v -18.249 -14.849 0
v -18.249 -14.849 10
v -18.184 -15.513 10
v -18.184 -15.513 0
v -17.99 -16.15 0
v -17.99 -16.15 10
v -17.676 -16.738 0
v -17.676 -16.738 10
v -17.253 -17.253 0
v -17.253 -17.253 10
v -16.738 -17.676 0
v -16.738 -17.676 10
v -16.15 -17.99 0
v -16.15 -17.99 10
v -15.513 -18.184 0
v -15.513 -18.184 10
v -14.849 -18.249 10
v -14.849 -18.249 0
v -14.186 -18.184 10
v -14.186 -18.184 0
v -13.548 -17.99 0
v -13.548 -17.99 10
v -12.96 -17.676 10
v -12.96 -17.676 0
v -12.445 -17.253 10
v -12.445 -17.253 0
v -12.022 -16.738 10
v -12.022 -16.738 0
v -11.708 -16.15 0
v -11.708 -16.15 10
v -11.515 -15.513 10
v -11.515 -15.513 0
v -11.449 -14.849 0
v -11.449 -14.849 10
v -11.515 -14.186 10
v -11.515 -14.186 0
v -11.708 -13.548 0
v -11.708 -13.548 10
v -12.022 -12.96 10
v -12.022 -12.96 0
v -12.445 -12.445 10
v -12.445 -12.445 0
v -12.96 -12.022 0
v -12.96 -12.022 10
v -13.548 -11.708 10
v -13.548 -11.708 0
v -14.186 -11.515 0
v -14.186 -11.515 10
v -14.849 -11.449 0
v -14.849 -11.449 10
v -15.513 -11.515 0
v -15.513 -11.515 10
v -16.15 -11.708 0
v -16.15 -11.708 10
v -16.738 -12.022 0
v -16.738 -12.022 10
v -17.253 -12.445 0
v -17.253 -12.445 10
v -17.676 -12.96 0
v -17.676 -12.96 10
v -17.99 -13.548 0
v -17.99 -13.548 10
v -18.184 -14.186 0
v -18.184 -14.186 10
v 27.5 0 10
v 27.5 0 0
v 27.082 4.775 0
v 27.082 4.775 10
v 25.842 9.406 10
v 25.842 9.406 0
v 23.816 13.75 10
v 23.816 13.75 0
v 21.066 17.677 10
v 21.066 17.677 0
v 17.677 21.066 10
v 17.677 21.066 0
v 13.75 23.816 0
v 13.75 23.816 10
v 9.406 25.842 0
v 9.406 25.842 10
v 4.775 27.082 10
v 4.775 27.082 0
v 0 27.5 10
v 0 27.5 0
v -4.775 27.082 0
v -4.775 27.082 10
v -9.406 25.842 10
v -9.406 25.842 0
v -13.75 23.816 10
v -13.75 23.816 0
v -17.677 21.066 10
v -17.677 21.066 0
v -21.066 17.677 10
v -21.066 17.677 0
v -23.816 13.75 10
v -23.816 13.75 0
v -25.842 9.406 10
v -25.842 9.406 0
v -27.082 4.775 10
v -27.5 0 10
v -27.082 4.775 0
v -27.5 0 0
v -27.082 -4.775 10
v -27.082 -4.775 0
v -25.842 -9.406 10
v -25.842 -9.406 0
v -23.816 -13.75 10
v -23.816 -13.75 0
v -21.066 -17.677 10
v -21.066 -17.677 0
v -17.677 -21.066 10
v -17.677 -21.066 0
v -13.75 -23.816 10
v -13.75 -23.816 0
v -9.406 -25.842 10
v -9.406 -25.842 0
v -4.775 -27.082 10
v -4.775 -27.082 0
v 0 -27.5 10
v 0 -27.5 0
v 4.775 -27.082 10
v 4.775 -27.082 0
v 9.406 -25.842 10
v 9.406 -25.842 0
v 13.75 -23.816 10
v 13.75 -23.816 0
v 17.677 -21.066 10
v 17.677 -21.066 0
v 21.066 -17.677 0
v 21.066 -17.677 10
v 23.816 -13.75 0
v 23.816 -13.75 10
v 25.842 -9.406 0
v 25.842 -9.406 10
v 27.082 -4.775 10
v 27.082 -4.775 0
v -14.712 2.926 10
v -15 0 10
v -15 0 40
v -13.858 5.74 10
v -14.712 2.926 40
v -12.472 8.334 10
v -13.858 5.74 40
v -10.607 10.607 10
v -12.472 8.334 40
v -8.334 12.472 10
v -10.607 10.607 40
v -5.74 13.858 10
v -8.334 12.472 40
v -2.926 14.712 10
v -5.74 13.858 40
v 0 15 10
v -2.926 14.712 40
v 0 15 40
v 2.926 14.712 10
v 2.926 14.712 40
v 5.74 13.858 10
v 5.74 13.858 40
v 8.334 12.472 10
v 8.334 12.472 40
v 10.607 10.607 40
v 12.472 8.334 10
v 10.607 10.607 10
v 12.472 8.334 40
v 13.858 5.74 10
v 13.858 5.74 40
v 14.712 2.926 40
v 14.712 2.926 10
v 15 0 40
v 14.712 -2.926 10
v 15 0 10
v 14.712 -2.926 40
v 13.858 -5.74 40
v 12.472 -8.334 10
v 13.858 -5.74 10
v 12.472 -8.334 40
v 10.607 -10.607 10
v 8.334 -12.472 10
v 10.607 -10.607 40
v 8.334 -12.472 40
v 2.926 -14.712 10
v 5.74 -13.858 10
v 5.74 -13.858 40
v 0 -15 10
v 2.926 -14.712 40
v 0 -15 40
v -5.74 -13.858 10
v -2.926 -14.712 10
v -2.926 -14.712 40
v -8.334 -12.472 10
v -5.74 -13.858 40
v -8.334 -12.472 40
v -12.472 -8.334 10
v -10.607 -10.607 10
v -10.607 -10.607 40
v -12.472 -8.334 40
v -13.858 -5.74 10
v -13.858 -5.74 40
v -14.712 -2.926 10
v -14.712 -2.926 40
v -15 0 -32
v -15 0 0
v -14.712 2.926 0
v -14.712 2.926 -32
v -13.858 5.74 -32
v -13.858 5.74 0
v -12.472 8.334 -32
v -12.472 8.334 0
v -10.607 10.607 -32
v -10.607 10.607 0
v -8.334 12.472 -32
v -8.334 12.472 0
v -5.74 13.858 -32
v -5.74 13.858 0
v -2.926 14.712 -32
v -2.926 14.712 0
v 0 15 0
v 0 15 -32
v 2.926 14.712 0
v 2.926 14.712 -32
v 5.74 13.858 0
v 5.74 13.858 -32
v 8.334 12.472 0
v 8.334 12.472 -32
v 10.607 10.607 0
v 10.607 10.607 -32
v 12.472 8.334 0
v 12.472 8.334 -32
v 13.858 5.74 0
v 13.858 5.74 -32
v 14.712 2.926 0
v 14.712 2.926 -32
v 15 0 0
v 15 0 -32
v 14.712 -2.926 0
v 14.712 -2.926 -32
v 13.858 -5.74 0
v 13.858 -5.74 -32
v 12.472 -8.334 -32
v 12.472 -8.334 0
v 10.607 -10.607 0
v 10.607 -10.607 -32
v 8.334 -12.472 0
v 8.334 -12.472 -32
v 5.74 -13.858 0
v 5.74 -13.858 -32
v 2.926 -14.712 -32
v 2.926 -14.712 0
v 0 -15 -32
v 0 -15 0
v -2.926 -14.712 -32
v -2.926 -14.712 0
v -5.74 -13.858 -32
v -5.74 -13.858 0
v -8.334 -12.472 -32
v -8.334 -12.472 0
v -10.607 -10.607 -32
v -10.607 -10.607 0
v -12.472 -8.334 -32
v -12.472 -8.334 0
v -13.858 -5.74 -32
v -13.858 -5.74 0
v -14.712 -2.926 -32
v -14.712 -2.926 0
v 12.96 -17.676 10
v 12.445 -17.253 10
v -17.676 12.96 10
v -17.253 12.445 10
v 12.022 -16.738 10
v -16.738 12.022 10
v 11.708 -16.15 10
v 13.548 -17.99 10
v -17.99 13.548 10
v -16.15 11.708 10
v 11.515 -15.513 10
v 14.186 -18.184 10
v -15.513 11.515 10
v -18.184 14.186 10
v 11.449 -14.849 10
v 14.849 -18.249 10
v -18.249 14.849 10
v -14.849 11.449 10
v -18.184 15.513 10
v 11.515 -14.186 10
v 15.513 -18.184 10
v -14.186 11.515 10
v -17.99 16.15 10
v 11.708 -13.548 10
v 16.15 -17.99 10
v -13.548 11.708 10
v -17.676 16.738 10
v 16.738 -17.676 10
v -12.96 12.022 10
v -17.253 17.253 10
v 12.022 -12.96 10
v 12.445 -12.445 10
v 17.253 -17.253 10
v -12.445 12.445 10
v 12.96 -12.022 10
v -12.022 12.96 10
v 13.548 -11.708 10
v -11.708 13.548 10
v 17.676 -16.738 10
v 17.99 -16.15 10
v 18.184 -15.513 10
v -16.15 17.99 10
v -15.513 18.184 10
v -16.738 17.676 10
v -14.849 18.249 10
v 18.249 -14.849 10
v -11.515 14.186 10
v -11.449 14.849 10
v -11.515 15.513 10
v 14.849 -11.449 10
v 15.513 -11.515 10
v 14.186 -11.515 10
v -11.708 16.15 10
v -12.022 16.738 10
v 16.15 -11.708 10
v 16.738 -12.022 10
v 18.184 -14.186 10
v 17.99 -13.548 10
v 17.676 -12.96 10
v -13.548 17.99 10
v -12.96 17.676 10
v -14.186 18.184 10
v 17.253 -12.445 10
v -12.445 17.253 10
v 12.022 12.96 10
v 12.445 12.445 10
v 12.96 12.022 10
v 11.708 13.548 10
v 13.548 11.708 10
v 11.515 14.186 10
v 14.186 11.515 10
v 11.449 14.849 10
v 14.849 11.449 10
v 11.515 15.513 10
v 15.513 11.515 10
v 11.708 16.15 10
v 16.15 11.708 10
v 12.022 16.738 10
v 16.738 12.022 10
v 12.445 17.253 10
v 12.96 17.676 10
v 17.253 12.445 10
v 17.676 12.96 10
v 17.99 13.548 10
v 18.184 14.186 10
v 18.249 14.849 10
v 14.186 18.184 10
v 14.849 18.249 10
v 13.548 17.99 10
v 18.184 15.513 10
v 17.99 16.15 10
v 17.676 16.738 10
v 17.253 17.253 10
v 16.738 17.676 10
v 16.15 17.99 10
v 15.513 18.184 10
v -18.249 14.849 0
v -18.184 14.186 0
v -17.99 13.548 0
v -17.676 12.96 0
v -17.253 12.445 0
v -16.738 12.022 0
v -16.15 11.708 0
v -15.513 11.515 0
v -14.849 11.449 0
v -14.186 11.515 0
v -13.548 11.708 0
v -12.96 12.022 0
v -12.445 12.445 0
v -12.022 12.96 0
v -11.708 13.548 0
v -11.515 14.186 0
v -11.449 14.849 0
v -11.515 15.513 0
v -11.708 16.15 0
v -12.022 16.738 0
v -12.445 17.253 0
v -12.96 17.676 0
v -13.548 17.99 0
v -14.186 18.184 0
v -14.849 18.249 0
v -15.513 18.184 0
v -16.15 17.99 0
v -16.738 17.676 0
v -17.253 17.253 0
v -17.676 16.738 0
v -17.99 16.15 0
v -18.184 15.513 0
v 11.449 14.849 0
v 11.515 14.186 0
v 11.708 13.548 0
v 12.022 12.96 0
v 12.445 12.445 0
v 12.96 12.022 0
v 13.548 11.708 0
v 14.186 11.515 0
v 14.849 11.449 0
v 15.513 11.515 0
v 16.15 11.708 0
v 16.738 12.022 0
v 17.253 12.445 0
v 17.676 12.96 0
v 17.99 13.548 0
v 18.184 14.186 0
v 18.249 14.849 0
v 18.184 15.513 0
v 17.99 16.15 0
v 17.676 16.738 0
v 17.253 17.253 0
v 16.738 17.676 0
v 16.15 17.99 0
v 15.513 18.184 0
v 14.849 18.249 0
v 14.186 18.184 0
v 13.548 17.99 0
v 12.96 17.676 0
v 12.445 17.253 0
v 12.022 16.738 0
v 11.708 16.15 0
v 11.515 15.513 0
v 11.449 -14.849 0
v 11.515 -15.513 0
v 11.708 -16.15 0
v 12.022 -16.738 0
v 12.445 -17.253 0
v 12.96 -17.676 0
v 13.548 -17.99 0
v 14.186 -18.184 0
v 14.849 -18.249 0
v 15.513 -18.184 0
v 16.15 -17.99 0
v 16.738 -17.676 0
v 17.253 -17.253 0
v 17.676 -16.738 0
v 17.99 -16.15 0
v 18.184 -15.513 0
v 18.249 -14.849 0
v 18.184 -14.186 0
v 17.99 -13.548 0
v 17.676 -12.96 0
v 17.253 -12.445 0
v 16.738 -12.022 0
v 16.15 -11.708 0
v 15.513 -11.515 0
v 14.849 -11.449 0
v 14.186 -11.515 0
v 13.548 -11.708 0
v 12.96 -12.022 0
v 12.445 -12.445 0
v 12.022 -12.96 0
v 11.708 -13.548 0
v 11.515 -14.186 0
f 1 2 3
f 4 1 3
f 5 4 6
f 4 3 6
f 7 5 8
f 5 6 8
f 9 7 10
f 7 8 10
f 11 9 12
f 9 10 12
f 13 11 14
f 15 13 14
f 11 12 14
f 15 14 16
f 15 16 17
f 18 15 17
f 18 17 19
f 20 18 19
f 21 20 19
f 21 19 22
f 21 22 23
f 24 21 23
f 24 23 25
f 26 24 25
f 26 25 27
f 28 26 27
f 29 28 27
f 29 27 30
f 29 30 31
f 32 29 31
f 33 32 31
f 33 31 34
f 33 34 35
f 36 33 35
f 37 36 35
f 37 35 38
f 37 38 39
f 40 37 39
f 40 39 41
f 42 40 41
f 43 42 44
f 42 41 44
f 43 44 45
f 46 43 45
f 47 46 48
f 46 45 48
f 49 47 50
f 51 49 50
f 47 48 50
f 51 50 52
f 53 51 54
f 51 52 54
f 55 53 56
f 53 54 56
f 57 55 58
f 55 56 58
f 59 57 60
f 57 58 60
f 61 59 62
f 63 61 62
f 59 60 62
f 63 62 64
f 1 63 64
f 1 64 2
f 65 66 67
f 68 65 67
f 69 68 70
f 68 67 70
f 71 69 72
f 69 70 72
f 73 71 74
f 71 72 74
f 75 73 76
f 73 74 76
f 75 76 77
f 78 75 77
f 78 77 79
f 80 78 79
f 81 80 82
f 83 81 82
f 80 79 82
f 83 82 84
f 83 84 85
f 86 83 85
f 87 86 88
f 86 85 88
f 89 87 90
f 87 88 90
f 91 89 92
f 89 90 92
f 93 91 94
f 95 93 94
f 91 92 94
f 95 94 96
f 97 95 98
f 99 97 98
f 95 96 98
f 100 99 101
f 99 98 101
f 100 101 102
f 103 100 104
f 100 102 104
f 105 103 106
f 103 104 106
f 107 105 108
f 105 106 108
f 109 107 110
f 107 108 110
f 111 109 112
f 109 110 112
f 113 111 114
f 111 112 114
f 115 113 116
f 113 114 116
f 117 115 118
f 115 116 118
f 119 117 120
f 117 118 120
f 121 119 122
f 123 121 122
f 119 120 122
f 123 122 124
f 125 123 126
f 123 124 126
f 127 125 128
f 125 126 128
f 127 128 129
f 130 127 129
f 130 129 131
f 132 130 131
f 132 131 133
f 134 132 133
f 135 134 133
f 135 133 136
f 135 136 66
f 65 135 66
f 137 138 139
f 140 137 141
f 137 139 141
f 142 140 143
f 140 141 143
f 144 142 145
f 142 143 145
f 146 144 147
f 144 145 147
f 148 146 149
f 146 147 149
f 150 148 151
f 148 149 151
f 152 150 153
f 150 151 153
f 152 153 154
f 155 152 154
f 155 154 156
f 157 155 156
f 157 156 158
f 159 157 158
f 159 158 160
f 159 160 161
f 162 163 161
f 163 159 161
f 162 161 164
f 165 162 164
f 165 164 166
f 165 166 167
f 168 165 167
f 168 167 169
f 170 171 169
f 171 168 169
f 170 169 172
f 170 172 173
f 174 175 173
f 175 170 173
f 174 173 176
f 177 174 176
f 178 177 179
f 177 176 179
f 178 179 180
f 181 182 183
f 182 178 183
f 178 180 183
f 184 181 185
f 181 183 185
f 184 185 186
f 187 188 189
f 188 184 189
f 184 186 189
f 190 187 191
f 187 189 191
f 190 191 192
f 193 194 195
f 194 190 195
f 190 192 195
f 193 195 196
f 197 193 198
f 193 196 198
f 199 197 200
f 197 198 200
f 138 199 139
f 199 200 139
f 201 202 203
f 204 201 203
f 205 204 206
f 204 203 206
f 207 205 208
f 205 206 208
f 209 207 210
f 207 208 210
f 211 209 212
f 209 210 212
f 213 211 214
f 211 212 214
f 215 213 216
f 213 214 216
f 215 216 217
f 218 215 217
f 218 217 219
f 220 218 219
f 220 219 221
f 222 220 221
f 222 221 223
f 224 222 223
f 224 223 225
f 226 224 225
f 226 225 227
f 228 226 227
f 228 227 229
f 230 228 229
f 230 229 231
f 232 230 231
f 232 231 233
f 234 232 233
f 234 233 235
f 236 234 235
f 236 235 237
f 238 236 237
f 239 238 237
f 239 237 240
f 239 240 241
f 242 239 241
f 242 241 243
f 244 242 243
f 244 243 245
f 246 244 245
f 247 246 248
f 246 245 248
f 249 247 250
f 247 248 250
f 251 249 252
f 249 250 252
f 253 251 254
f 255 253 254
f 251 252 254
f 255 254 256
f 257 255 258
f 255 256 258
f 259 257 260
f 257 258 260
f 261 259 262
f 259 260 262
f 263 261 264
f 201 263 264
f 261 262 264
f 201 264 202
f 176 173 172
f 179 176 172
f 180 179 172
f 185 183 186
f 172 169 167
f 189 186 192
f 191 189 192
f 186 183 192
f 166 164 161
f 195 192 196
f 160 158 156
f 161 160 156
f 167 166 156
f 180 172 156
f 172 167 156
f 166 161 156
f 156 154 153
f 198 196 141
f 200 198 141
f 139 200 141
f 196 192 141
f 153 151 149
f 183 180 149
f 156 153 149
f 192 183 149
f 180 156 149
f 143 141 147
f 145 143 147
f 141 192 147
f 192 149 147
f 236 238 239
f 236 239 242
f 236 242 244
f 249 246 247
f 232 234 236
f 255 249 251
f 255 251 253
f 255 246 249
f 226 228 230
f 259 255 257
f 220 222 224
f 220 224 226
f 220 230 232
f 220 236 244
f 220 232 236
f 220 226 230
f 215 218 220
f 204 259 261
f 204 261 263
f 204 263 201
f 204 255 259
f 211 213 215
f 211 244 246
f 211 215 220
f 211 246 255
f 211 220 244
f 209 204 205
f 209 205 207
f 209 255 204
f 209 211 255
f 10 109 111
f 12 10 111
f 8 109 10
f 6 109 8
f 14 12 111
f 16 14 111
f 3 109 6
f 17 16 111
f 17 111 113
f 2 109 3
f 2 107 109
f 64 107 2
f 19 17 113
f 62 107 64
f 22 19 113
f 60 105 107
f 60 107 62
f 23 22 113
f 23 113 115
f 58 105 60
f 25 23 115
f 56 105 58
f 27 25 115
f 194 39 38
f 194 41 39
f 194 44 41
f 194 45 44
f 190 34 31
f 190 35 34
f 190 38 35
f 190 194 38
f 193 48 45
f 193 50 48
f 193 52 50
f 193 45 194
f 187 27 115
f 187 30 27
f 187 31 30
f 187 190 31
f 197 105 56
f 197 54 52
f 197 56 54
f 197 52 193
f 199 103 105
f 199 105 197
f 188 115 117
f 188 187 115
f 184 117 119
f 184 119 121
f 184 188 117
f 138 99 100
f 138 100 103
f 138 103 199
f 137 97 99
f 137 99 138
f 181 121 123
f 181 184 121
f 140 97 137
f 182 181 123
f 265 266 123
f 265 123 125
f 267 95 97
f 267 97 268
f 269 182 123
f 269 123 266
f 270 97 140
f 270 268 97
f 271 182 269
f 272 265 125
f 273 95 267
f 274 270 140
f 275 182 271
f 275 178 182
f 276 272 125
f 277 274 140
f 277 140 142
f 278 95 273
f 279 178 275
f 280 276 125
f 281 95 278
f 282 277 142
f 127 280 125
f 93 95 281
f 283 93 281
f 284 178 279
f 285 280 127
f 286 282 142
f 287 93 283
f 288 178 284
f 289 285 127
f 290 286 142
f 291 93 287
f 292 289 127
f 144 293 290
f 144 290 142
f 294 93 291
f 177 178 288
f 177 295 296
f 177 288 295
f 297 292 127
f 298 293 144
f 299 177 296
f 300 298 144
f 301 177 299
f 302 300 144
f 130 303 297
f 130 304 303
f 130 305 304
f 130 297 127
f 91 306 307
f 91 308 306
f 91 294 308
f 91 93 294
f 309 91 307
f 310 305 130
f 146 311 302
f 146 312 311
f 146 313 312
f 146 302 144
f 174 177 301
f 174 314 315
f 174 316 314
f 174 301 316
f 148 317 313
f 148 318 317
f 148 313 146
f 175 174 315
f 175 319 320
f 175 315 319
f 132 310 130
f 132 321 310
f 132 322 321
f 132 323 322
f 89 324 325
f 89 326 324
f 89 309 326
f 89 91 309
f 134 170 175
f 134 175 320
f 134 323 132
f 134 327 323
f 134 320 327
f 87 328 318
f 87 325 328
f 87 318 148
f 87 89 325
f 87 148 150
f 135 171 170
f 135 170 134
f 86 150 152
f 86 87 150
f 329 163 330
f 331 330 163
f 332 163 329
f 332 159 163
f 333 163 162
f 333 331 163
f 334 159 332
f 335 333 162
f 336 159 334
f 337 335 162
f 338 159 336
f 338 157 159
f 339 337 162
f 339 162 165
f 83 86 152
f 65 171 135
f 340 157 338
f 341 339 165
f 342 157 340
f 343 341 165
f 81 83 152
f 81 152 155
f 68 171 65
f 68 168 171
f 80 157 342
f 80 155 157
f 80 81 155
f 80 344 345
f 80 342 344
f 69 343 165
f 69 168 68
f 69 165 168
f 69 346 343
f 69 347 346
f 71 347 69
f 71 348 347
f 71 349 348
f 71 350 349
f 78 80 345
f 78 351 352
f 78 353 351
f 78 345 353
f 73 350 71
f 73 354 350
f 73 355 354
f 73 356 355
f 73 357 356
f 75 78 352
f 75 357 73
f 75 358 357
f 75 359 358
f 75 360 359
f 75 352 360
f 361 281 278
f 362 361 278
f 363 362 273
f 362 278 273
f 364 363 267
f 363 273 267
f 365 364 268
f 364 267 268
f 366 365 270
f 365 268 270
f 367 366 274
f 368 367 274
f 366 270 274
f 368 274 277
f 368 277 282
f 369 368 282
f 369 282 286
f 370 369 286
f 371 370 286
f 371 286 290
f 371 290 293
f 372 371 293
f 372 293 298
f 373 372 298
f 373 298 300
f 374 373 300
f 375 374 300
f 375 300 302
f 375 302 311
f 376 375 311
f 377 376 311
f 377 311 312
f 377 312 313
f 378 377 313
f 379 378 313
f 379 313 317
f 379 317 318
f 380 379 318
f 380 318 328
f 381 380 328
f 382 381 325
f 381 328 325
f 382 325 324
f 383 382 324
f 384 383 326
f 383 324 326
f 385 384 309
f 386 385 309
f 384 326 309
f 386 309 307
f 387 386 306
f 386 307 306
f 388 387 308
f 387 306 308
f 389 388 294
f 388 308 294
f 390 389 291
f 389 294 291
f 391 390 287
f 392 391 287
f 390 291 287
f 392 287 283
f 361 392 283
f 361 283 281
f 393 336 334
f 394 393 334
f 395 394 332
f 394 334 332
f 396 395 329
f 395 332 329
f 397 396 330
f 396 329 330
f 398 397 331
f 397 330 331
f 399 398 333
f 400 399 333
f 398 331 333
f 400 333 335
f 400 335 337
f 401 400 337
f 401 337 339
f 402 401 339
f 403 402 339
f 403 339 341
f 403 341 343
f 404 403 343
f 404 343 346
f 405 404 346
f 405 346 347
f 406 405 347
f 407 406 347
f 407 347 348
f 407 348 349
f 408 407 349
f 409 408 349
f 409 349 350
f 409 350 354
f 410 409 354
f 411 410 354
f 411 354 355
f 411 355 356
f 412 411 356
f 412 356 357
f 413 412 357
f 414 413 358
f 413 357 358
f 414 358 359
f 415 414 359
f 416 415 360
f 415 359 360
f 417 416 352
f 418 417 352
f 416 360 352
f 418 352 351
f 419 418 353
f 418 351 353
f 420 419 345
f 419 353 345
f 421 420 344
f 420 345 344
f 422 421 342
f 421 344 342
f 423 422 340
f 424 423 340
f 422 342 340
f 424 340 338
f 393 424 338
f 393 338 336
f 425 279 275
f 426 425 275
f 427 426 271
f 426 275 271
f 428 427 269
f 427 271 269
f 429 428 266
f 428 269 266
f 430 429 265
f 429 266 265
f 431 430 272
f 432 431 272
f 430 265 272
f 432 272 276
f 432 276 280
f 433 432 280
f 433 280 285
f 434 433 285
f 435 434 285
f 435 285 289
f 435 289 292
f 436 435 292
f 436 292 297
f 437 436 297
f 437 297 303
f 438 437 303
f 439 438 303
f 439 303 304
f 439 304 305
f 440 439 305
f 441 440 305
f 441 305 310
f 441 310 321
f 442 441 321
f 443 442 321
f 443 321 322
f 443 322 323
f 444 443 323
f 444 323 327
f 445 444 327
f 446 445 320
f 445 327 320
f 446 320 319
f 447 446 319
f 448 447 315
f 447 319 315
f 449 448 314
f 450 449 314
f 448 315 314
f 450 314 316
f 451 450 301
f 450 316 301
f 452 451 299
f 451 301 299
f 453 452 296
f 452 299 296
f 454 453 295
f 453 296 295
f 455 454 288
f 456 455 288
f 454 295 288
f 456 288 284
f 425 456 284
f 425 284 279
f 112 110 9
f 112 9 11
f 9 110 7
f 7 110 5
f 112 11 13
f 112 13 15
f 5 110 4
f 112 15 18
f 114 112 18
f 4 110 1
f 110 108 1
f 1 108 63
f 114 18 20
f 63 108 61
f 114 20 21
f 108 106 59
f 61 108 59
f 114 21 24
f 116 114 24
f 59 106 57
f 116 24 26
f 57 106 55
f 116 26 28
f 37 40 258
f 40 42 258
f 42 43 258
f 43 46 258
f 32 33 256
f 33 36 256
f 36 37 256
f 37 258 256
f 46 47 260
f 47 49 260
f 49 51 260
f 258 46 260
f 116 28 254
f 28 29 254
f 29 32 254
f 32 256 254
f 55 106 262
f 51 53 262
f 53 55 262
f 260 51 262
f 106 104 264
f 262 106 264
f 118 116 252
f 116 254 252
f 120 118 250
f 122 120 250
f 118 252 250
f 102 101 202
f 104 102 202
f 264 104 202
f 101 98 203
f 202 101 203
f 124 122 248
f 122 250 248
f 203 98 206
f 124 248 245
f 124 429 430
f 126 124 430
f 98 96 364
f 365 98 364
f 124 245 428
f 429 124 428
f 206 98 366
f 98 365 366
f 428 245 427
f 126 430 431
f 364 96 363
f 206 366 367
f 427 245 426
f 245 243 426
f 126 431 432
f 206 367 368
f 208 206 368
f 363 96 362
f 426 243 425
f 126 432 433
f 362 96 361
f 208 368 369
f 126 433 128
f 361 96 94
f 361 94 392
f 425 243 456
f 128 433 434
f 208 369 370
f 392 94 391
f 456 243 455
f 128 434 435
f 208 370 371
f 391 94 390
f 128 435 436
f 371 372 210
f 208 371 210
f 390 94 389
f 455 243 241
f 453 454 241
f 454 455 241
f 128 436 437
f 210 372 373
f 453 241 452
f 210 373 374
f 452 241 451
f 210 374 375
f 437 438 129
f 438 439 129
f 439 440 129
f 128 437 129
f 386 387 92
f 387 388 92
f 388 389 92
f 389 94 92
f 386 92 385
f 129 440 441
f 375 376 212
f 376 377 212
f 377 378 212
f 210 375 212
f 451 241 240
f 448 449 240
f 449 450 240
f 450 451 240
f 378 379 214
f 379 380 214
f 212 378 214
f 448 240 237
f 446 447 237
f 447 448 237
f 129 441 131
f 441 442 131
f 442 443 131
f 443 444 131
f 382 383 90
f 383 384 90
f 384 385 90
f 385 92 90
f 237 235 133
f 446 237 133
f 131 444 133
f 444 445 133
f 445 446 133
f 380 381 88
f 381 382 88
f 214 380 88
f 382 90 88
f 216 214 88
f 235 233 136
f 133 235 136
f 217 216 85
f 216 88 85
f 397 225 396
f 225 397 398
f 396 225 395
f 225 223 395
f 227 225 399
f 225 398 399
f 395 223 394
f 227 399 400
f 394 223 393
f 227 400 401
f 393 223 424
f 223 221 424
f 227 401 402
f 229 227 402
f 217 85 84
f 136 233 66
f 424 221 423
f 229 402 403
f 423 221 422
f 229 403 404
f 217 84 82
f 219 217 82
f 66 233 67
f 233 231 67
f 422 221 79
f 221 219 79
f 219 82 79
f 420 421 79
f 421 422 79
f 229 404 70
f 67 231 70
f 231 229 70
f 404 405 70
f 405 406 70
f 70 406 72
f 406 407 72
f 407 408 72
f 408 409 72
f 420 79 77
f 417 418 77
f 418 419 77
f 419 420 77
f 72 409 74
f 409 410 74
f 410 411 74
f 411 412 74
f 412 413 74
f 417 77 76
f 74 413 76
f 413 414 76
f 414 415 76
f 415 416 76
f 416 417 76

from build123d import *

# Parameters (mm, degrees)
SKETCH_1_R           = 27.5
SKETCH_1_R_2         = 3
EXTRUDE_1_DEPTH      = 10
HOLE_WIZARD_M8_1_D   = 6.8
EXTRUDE_2_DEPTH      = 32
EXTRUDE_2_DEPTH_BACK = 40
SKETCH_6_R           = 15


with BuildPart() as part:
    # 草图1 → 凸台-拉伸1 (new body)
    with BuildSketch(Plane.XY):
        Circle(SKETCH_1_R)
        with Locations((-14.849242405, -14.849242405)):
            Circle(SKETCH_1_R_2, mode=Mode.SUBTRACT)
        with Locations((14.849242405, -14.849242405)):
            Circle(SKETCH_1_R_2, mode=Mode.SUBTRACT)
        with Locations((14.849242405, 14.849242405)):
            Circle(SKETCH_1_R_2, mode=Mode.SUBTRACT)
        with Locations((-14.849242405, 14.849242405)):
            Circle(SKETCH_1_R_2, mode=Mode.SUBTRACT)
    extrude(amount=EXTRUDE_1_DEPTH)

    # M8 螺纹孔1 (through all)
    with Locations(Plane(origin=(0, 0, 0), x_dir=(1, 0, 0), z_dir=(0, 0, -1))):
        with Locations((-14.849242405, -14.849242405), (14.849242405, -14.849242405), (14.849242405, 14.849242405), (-14.849242405, 14.849242405)):
            Hole(HOLE_WIZARD_M8_1_D / 2)

    # 草图6 → 凸台-拉伸2 (add, two sides: drawn at the far end of the back side and taken through both)
    with BuildSketch(Plane(origin=(0, 0, 0), x_dir=(-1, 0, 0), z_dir=(0, 0, -1)).offset(-EXTRUDE_2_DEPTH_BACK)):
        Circle(SKETCH_6_R)
    extrude(amount=EXTRUDE_2_DEPTH + EXTRUDE_2_DEPTH_BACK)


solid = part.part
